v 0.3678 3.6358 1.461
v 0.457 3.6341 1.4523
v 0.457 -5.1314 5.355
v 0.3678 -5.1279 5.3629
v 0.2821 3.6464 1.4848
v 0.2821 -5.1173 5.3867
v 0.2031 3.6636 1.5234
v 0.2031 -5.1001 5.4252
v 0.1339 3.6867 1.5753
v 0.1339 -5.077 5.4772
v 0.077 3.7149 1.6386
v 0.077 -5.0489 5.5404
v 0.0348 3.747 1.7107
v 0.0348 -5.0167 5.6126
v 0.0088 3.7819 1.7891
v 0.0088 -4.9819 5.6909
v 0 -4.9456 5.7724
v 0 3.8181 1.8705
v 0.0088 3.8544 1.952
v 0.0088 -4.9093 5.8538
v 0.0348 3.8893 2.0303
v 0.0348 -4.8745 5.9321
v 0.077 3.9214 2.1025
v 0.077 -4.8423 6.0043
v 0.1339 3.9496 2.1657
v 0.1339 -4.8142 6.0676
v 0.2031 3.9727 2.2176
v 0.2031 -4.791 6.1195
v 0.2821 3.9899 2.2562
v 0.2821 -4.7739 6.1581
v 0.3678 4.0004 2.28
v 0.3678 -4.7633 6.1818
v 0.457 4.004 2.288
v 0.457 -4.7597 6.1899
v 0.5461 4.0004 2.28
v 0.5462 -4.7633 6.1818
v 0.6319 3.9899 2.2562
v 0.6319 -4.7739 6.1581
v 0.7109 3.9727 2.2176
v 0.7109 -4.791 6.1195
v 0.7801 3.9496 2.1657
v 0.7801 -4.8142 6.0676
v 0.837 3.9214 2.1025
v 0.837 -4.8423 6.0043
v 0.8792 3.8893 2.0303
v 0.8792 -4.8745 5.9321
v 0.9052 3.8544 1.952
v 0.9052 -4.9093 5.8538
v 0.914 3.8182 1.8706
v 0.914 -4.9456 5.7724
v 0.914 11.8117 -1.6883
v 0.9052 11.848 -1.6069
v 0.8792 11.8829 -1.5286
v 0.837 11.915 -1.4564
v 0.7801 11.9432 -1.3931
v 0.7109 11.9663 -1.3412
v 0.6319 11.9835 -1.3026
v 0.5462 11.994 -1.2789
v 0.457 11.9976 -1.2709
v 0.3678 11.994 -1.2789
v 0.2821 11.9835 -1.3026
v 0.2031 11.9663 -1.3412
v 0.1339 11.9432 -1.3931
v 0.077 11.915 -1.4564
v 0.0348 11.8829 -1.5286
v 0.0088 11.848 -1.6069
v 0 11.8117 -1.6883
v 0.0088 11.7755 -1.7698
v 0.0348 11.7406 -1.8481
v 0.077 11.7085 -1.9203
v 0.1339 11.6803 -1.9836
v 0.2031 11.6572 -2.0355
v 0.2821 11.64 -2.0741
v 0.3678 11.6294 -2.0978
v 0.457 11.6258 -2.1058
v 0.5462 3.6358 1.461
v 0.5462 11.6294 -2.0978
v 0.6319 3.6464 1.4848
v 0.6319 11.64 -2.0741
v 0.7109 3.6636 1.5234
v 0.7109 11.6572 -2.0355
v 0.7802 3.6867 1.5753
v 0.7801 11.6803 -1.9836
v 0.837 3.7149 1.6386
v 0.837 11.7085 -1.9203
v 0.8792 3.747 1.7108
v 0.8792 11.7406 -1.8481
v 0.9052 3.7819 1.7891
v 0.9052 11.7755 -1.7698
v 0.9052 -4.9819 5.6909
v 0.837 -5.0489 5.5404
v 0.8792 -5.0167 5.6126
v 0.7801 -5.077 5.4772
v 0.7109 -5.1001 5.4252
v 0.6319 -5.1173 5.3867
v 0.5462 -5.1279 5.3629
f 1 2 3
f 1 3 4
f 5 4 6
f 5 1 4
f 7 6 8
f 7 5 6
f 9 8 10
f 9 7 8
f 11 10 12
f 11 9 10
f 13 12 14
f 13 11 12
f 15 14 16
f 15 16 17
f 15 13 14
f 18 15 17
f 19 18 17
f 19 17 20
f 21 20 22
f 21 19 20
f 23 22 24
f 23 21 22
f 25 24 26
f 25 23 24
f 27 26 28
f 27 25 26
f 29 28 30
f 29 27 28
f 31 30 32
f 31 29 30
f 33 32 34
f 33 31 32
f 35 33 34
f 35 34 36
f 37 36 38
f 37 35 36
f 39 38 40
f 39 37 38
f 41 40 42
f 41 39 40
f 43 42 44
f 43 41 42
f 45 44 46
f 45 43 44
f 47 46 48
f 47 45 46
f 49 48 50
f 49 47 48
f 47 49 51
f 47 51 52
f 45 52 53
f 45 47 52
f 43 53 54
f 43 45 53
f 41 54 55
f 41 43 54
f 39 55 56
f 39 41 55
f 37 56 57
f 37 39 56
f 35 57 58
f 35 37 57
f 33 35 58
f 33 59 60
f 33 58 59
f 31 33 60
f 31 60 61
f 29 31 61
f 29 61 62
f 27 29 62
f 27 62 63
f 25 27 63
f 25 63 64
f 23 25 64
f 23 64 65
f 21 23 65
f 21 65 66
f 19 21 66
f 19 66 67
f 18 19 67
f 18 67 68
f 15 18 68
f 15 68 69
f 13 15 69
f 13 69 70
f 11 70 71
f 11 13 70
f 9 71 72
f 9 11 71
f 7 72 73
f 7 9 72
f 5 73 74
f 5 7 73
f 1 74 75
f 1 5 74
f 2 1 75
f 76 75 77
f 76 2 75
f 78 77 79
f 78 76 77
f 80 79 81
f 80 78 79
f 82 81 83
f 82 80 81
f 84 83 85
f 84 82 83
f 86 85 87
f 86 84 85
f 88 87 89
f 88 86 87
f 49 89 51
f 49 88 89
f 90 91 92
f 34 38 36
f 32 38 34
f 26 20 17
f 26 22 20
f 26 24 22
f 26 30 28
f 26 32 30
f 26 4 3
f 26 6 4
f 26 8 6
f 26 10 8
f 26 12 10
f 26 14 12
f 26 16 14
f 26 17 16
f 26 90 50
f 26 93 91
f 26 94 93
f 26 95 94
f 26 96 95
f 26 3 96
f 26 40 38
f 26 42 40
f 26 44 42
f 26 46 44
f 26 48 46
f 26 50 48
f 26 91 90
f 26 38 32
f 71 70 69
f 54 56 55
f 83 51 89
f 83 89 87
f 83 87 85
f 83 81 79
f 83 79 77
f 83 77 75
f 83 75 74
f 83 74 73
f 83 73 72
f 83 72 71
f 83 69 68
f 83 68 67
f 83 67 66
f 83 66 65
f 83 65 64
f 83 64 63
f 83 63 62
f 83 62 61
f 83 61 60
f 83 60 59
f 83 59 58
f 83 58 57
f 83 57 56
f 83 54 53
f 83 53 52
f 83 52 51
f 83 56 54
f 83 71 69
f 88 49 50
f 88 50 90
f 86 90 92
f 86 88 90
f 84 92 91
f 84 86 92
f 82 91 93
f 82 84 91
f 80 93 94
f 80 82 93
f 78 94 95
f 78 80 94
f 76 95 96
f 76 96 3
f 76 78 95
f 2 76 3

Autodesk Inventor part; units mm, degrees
ref_plane "YZ Plane" through (0, 0, 0) normal (1, 0, 0) x (0, 1, 0)
ref_plane "XZ Plane" through (0, 0, 0) normal (0, 1, 0) x (-1, 0, 0)
ref_plane "XY Plane" through (0, 0, 0) normal (0, 0, 1) x (1, 0, 0)
sketch "Sketch1" plane through (0, 0, 0) normal (1, 0, 0) x (0, 1, 0)
  spline S0 degree 3 poles (-4.479, -27.0431) (-4.7662, -26.7746) (-5.439, -26.5061) (-6.0629, -26.2376) (-6.6869, -25.9691) (-7.2127, -25.7006) (-7.3009, -25.4322) (-7.389, -25.1637) (-7.0326, -24.8952) (-6.4617, -24.6267) (-5.8908, -24.3582) (-5.1506, -24.0897) (-4.7189, -23.8212) (-4.2873, -23.5527) (-4.1983, -23.2842) (-4.5096, -23.0157) (-4.8208, -22.7472) (-5.5075, -22.4787) (-6.1264, -22.2102) (-6.7453, -21.9417) (-7.2474, -21.6732) (-7.3085, -21.4047) (-7.3696, -21.1362) (-6.9849, -20.8677) (-6.4028, -20.5992) (-5.8207, -20.3307) (-5.0872, -20.0622) (-4.6758, -19.7937) (-4.2645, -19.5252) (-4.2079, -19.2568) (-4.5426, -18.9883) (-4.8772, -18.7198) (-5.5767, -18.4513) (-6.1893, -18.1828) (-6.802, -17.9143) (-7.2794, -17.6458) (-7.3133, -17.3773) (-7.3473, -17.1088) (-6.935, -16.8403) (-6.3428, -16.5718) (-5.7505, -16.3033) (-5.0251, -16.0348) (-4.6349, -15.7663) (-4.2446, -15.4978) (-4.2205, -15.2293) (-4.5779, -14.9608) (-4.9354, -14.6923) (-5.6463, -14.4238) (-6.2516, -14.1553) (-6.8569, -13.8868) (-7.3087, -13.6183) (-7.3154, -13.3498) (-7.3221, -13.0814) (-6.8831, -12.8129) (-6.2818, -12.5444) (-5.6805, -12.2759) (-4.9645, -12.0074) (-4.5961, -11.7389) (-4.2277, -11.4704) (-4.236, -11.2019) (-4.6156, -10.9334) (-4.9952, -10.6649) (-5.7162, -10.3964) (-6.313, -10.1279) (-6.9098, -9.8594) (-7.3353, -9.5909) (-7.3147, -9.3224) (-7.2941, -9.0539) (-6.8291, -8.7854) (-6.22, -8.5169) (-5.6108, -8.2484) (-4.9055, -7.9799) (-4.5596, -7.7114) (-4.2137, -7.4429) (-4.2544, -7.1745) (-4.6555, -6.906) (-5.0566, -6.6375) (-5.7863, -6.369) (-6.3735, -6.1005) (-6.9607, -5.832) (-7.359, -5.5635) (-7.3112, -5.295) (-7.2634, -5.0265) (-6.7733, -4.758) (-6.1573, -4.4895) (-5.5414, -4.221) (-4.8482, -3.9525) (-4.5255, -3.684) (-4.2027, -3.4155) (-4.2758, -3.147) (-4.6975, -2.8785) (-5.1193, -2.61) (-5.8564, -2.3415) (-6.433, -2.073) (-7.0095, -1.8045) (-7.3799, -1.536) (-7.3049, -1.2675) (-7.23, -0.9991) (-6.7157, -0.7306) (-6.0941, -0.4621) (-5.4725, -0.1936) (-4.7927, 0.0749) (-4.4937, 0.3434) (-4.1946, 0.6119) (-4.3, 0.8804) (-4.7417, 1.1489) (-5.1834, 1.4174) (-5.9265, 1.6859) (-6.4913, 1.9544) (-7.0561, 2.2229) (-7.3978, 2.4914) (-7.2959, 2.7599) (-7.194, 3.0284) (-6.6565, 3.2969) (-6.0304, 3.5654) (-5.4043, 3.8339) (-4.7391, 4.1024) (-4.4644, 4.3709) (-4.1896, 4.6394) (-4.327, 4.9079) (-4.7878, 5.1763) (-5.2486, 5.4448) (-5.9964, 5.7133) (-6.5483, 5.9818) (-7.1003, 6.2503) (-7.4128, 6.5188) (-7.2841, 6.7873) (-7.1554, 7.0558) (-6.5956, 7.3243) (-5.9662, 7.5928) (-5.3368, 7.8613) (-4.6875, 8.1298) (-4.4375, 8.3983) (-4.1876, 8.6668) (-4.3567, 8.9353) (-4.8358, 9.2038) (-5.3148, 9.4723) (-6.0659, 9.7408) (-6.604, 10.0093) (-7.1422, 10.2778) (-7.4249, 10.5463) (-7.2696, 10.8148) (-7.1143, 11.0832) (-6.5334, 11.3517) (-5.9018, 11.6202) (-5.2702, 11.8887) (-4.638, 12.1572) (-4.4133, 12.4257) (-4.1886, 12.6942) (-4.3892, 12.9627) (-4.8856, 13.2312) (-5.382, 13.4997) (-6.135, 13.7682) (-6.6583, 14.0367) (-7.1816, 14.3052) (-7.434, 14.5737) (-7.2524, 14.8422) (-7.0708, 15.1107) (-6.4697, 15.3792) (-5.8372, 15.6477) (-5.2046, 15.9162) (-4.5906, 16.1847) (-4.3916, 16.4532) (-4.1926, 16.7217) (-4.4244, 16.9902) (-4.9372, 17.2586) (-5.45, 17.5271) (-6.2034, 17.7956) (-6.711, 18.0641) (-7.2185, 18.3326) (-7.44, 18.6011) (-7.2325, 18.8696) (-7.025, 19.1381) (-6.4049, 19.4066) (-5.7725, 19.6751) (-5.1402, 19.9436) (-4.5456, 20.2121) (-4.3726, 20.4806) (-4.1997, 20.7491) (-4.4621, 21.0176) (-4.9904, 21.2861) (-5.5187, 21.5546) (-6.2712, 21.8231) (-6.762, 22.0916) (-7.2528, 22.3601) (-7.4431, 22.6286) (-7.21, 22.8971) (-6.977, 23.1656) (-6.339, 23.434) (-5.708, 23.7025) (-5.077, 23.971) (-4.5029, 24.2395) (-4.3563, 24.508) (-4.3292, 24.5576) (-4.3155, 24.6073) (-4.3155, 24.6569) knots -81.21017 -81.21017 -81.21017 -81.21017 -79.944914 -79.944914 -79.944914 -78.679659 -78.679659 -78.679659 -77.414403 -77.414403 -77.414403 -76.149147 -76.149147 -76.149147 -74.883892 -74.883892 -74.883892 -73.618636 -73.618636 -73.618636 -72.35338 -72.35338 -72.35338 -71.088125 -71.088125 -71.088125 -69.822869 -69.822869 -69.822869 -68.557613 -68.557613 -68.557613 -67.292358 -67.292358 -67.292358 -66.027102 -66.027102 -66.027102 -64.761846 -64.761846 -64.761846 -63.496591 -63.496591 -63.496591 -62.231335 -62.231335 -62.231335 -60.96608 -60.96608 -60.96608 -59.700824 -59.700824 -59.700824 -58.435568 -58.435568 -58.435568 -57.170313 -57.170313 -57.170313 -55.905057 -55.905057 -55.905057 -54.639801 -54.639801 -54.639801 -53.374546 -53.374546 -53.374546 -52.10929 -52.10929 -52.10929 -50.844034 -50.844034 -50.844034 -49.578779 -49.578779 -49.578779 -48.313523 -48.313523 -48.313523 -47.048267 -47.048267 -47.048267 -45.783012 -45.783012 -45.783012 -44.517756 -44.517756 -44.517756 -43.2525 -43.2525 -43.2525 -41.987245 -41.987245 -41.987245 -40.721989 -40.721989 -40.721989 -39.456733 -39.456733 -39.456733 -38.191478 -38.191478 -38.191478 -36.926222 -36.926222 -36.926222 -35.660966 -35.660966 -35.660966 -34.395711 -34.395711 -34.395711 -33.130455 -33.130455 -33.130455 -31.865199 -31.865199 -31.865199 -30.599944 -30.599944 -30.599944 -29.334688 -29.334688 -29.334688 -28.069432 -28.069432 -28.069432 -26.804177 -26.804177 -26.804177 -25.538921 -25.538921 -25.538921 -24.273665 -24.273665 -24.273665 -23.00841 -23.00841 -23.00841 -21.743154 -21.743154 -21.743154 -20.477898 -20.477898 -20.477898 -19.212643 -19.212643 -19.212643 -17.947387 -17.947387 -17.947387 -16.682131 -16.682131 -16.682131 -15.416876 -15.416876 -15.416876 -14.15162 -14.15162 -14.15162 -12.886364 -12.886364 -12.886364 -11.621109 -11.621109 -11.621109 -10.355853 -10.355853 -10.355853 -9.090597 -9.090597 -9.090597 -7.825342 -7.825342 -7.825342 -6.560086 -6.560086 -6.560086 -5.29483 -5.29483 -5.29483 -4.029575 -4.029575 -4.029575 -2.764319 -2.764319 -2.764319 -1.499063 -1.499063 -1.499063 -0.233808 -0.233808 -0.233808 0 0 0 0 projected
  spline S1 degree 3 poles (-4.3155, 25.6569) (-4.3155, 25.3884) (-4.761, 25.1199) (-5.3643, 24.8514) (-5.9676, 24.5829) (-6.6811, 24.3144) (-7.044, 24.0459) (-7.407, 23.7774) (-7.3908, 23.5089) (-7.0058, 23.2404) (-6.6209, 22.9719) (-5.8977, 22.7034) (-5.3031, 22.4349) (-4.7085, 22.1664) (-4.2896, 21.8979) (-4.3169, 21.6294) (-4.3441, 21.3609) (-4.8154, 21.0925) (-5.4263, 20.824) (-6.0373, 20.5555) (-6.7397, 20.287) (-7.08, 20.0185) (-7.4203, 19.75) (-7.3716, 19.4815) (-6.9654, 19.213) (-6.5592, 18.9445) (-5.8275, 18.676) (-5.2428, 18.4075) (-4.6581, 18.139) (-4.2666, 17.8705) (-4.3211, 17.602) (-4.3755, 17.3335) (-4.8716, 17.065) (-5.4891, 16.7965) (-6.1066, 16.528) (-6.7965, 16.2595) (-7.1136, 15.991) (-7.4306, 15.7225) (-7.3496, 15.454) (-6.9228, 15.1855) (-6.4961, 14.9171) (-5.7574, 14.6486) (-5.1836, 14.3801) (-4.6099, 14.1116) (-4.2465, 13.8431) (-4.328, 13.5746) (-4.4096, 13.3061) (-4.9297, 13.0376) (-5.5525, 12.7691) (-6.1753, 12.5006) (-6.8516, 12.2321) (-7.1447, 11.9636) (-7.4379, 11.6951) (-7.3247, 11.4266) (-6.8782, 11.1581) (-6.4318, 10.8896) (-5.6874, 10.6211) (-5.1256, 10.3526) (-4.5639, 10.0841) (-4.2292, 9.8156) (-4.3377, 9.5471) (-4.4462, 9.2786) (-4.9893, 9.0101) (-5.6163, 8.7417) (-6.2434, 8.4732) (-6.9047, 8.2047) (-7.1735, 7.9362) (-7.4422, 7.6677) (-7.297, 7.3992) (-6.8316, 7.1307) (-6.3663, 6.8622) (-5.6176, 6.5937) (-5.0689, 6.3252) (-4.5202, 6.0567) (-4.2149, 5.7882) (-4.3502, 5.5197) (-4.4854, 5.2512) (-5.0505, 4.9827) (-5.6806, 4.7142) (-6.3106, 4.4457) (-6.9558, 4.1772) (-7.1996, 3.9087) (-7.4434, 3.6402) (-7.2665, 3.3717) (-6.7832, 3.1032) (-6.2998, 2.8348) (-5.5481, 2.5663) (-5.0135, 2.2978) (-4.4789, 2.0293) (-4.2036, 1.7608) (-4.3654, 1.4923) (-4.5271, 1.2238) (-5.1131, 0.9553) (-5.7451, 0.6868) (-6.377, 0.4183) (-7.0048, 0.1498) (-7.2233, -0.1187) (-7.4417, -0.3872) (-7.2334, -0.6557) (-6.7329, -0.9242) (-6.2324, -1.1927) (-5.4792, -1.4612) (-4.9597, -1.7297) (-4.4401, -1.9982) (-4.1953, -2.2667) (-4.3832, -2.5352) (-4.5712, -2.8037) (-5.177, -3.0722) (-5.8097, -3.3406) (-6.4423, -3.6091) (-7.0516, -3.8776) (-7.2443, -4.1461) (-7.4369, -4.4146) (-7.1976, -4.6831) (-6.6809, -4.9516) (-6.1642, -5.2201) (-5.4109, -5.4886) (-4.9074, -5.7571) (-4.4039, -6.0256) (-4.19, -6.2941) (-4.4038, -6.5626) (-4.6176, -6.8311) (-5.2422, -7.0996) (-5.8743, -7.3681) (-6.5064, -7.6366) (-7.0961, -7.9051) (-7.2626, -8.1736) (-7.4291, -8.4421) (-7.1593, -8.7106) (-6.6273, -8.9791) (-6.0954, -9.2476) (-5.3433, -9.516) (-4.8568, -9.7845) (-4.3702, -10.053) (-4.1877, -10.3215) (-4.4269, -10.59) (-4.6662, -10.8585) (-5.3083, -11.127) (-5.9388, -11.3955) (-6.5693, -11.664) (-7.1382, -11.9325) (-7.2783, -12.201) (-7.4183, -12.4695) (-7.1185, -12.738) (-6.5722, -13.0065) (-6.026, -13.275) (-5.2767, -13.5435) (-4.808, -13.812) (-4.3393, -14.0805) (-4.1884, -14.349) (-4.4526, -14.6175) (-4.7169, -14.886) (-5.3754, -15.1545) (-6.0031, -15.4229) (-6.6308, -15.6914) (-7.1779, -15.9599) (-7.2912, -16.2284) (-7.4046, -16.4969) (-7.0752, -16.7654) (-6.5157, -17.0339) (-5.9563, -17.3024) (-5.211, -17.5709) (-4.761, -17.8394) (-4.3111, -18.1079) (-4.1921, -18.3764) (-4.4809, -18.6449) (-4.7697, -18.9134) (-5.4434, -19.1819) (-6.067, -19.4504) (-6.6907, -19.7189) (-7.215, -19.9874) (-7.3014, -20.2559) (-7.3879, -20.5244) (-7.0296, -20.7929) (-6.4579, -21.0614) (-5.8863, -21.3299) (-5.1464, -21.5983) (-4.7161, -21.8668) (-4.2857, -22.1353) (-4.1989, -22.4038) (-4.5116, -22.6723) (-4.8244, -22.9408) (-5.512, -23.2093) (-6.1305, -23.4778) (-6.749, -23.7463) (-7.2495, -24.0148) (-7.3089, -24.2833) (-7.3682, -24.5518) (-6.9818, -24.8203) (-6.3989, -25.0888) (-5.8161, -25.3573) (-5.0831, -25.6258) (-4.6731, -25.8943) (-4.2631, -26.1628) (-4.2086, -26.4313) (-4.5448, -26.6998) (-4.6881, -26.8142) (-4.8942, -26.9287) (-5.1345, -27.0431) knots 0 0 0 0 1.265256 1.265256 1.265256 2.530511 2.530511 2.530511 3.795767 3.795767 3.795767 5.061023 5.061023 5.061023 6.326278 6.326278 6.326278 7.591534 7.591534 7.591534 8.85679 8.85679 8.85679 10.122045 10.122045 10.122045 11.387301 11.387301 11.387301 12.652557 12.652557 12.652557 13.917812 13.917812 13.917812 15.183068 15.183068 15.183068 16.448324 16.448324 16.448324 17.713579 17.713579 17.713579 18.978835 18.978835 18.978835 20.244091 20.244091 20.244091 21.509346 21.509346 21.509346 22.774602 22.774602 22.774602 24.039858 24.039858 24.039858 25.305113 25.305113 25.305113 26.570369 26.570369 26.570369 27.835625 27.835625 27.835625 29.10088 29.10088 29.10088 30.366136 30.366136 30.366136 31.631392 31.631392 31.631392 32.896647 32.896647 32.896647 34.161903 34.161903 34.161903 35.427159 35.427159 35.427159 36.692414 36.692414 36.692414 37.95767 37.95767 37.95767 39.222926 39.222926 39.222926 40.488181 40.488181 40.488181 41.753437 41.753437 41.753437 43.018693 43.018693 43.018693 44.283948 44.283948 44.283948 45.549204 45.549204 45.549204 46.814459 46.814459 46.814459 48.079715 48.079715 48.079715 49.344971 49.344971 49.344971 50.610226 50.610226 50.610226 51.875482 51.875482 51.875482 53.140738 53.140738 53.140738 54.405993 54.405993 54.405993 55.671249 55.671249 55.671249 56.936505 56.936505 56.936505 58.20176 58.20176 58.20176 59.467016 59.467016 59.467016 60.732272 60.732272 60.732272 61.997527 61.997527 61.997527 63.262783 63.262783 63.262783 64.528039 64.528039 64.528039 65.793294 65.793294 65.793294 67.05855 67.05855 67.05855 68.323806 68.323806 68.323806 69.589061 69.589061 69.589061 70.854317 70.854317 70.854317 72.119573 72.119573 72.119573 73.384828 73.384828 73.384828 74.650084 74.650084 74.650084 75.91534 75.91534 75.91534 77.180595 77.180595 77.180595 78.445851 78.445851 78.445851 79.711107 79.711107 79.711107 80.976362 80.976362 80.976362 82.241618 82.241618 82.241618 82.780966 82.780966 82.780966 82.780966 projected
  line L0 (-4.7597, 6.1899) -> (4.004, 2.288)
  line L1 (-5.1314, 6.3554) -> (4.8686, 6.3554) construction
  line L2 (-5.1314, 5.355) -> (3.6323, 1.4531)
  line L3 (-5.1314, 5.355) -> (4.8686, 5.355) construction
  line L4 (4.004, 2.288) -> (3.6323, 1.4531)
  line L5 (-5.1314, 5.355) -> (-4.7597, 6.1899)
  point P0 (0, 0)
  dimension "d1" = 24
  dimension "d3" = 24
extrude "Extrusion1" add sketch "Sketch1" along normal blind 0.914 contours L5 S1 L2 | S1 L5 L0 L4 L2
sketch "Sketch2" plane through (0, 4.004, 2.288) normal (0, 0.9135455, -0.4067366) x (1, 0, 0)
  line L0 (0, 0.9139) -> (0, 0) projected
  line L1 (0, 0) -> (0.914, 0) projected
  line L2 (0.914, 0.9139) -> (0.914, 0) projected
  line L3 (0, 0.9139) -> (0.914, 0.9139) projected
  line L4 (0.457, 0.9139) -> (0.457, 0) construction
  line L5 (0.914, 0.457) -> (0, 0.457) construction
  circle A0 centre (0.457, 0.457) radius 0.457
extrude "Extrusion2" cut sketch "Sketch2" against normal blind 20 contours L3 A0 L0 | A0 L1 L0 | L3 L2 A0 | A0 L2 L1
sketch "Sketch3" plane through (0.457, 3.8182, 1.8706) normal (0, 0.9135455, -0.4067366) x (1, 0, 0)
  circle A0 centre (0, 0) radius 0.457 projected
  circle A1 centre (0, 0) radius 0.457
  point P0 (-0.457, 3.2618)
extrude "Extrusion3" add sketch "Sketch3" along normal blind 8.75
properties part number "Carriage Tooth"
